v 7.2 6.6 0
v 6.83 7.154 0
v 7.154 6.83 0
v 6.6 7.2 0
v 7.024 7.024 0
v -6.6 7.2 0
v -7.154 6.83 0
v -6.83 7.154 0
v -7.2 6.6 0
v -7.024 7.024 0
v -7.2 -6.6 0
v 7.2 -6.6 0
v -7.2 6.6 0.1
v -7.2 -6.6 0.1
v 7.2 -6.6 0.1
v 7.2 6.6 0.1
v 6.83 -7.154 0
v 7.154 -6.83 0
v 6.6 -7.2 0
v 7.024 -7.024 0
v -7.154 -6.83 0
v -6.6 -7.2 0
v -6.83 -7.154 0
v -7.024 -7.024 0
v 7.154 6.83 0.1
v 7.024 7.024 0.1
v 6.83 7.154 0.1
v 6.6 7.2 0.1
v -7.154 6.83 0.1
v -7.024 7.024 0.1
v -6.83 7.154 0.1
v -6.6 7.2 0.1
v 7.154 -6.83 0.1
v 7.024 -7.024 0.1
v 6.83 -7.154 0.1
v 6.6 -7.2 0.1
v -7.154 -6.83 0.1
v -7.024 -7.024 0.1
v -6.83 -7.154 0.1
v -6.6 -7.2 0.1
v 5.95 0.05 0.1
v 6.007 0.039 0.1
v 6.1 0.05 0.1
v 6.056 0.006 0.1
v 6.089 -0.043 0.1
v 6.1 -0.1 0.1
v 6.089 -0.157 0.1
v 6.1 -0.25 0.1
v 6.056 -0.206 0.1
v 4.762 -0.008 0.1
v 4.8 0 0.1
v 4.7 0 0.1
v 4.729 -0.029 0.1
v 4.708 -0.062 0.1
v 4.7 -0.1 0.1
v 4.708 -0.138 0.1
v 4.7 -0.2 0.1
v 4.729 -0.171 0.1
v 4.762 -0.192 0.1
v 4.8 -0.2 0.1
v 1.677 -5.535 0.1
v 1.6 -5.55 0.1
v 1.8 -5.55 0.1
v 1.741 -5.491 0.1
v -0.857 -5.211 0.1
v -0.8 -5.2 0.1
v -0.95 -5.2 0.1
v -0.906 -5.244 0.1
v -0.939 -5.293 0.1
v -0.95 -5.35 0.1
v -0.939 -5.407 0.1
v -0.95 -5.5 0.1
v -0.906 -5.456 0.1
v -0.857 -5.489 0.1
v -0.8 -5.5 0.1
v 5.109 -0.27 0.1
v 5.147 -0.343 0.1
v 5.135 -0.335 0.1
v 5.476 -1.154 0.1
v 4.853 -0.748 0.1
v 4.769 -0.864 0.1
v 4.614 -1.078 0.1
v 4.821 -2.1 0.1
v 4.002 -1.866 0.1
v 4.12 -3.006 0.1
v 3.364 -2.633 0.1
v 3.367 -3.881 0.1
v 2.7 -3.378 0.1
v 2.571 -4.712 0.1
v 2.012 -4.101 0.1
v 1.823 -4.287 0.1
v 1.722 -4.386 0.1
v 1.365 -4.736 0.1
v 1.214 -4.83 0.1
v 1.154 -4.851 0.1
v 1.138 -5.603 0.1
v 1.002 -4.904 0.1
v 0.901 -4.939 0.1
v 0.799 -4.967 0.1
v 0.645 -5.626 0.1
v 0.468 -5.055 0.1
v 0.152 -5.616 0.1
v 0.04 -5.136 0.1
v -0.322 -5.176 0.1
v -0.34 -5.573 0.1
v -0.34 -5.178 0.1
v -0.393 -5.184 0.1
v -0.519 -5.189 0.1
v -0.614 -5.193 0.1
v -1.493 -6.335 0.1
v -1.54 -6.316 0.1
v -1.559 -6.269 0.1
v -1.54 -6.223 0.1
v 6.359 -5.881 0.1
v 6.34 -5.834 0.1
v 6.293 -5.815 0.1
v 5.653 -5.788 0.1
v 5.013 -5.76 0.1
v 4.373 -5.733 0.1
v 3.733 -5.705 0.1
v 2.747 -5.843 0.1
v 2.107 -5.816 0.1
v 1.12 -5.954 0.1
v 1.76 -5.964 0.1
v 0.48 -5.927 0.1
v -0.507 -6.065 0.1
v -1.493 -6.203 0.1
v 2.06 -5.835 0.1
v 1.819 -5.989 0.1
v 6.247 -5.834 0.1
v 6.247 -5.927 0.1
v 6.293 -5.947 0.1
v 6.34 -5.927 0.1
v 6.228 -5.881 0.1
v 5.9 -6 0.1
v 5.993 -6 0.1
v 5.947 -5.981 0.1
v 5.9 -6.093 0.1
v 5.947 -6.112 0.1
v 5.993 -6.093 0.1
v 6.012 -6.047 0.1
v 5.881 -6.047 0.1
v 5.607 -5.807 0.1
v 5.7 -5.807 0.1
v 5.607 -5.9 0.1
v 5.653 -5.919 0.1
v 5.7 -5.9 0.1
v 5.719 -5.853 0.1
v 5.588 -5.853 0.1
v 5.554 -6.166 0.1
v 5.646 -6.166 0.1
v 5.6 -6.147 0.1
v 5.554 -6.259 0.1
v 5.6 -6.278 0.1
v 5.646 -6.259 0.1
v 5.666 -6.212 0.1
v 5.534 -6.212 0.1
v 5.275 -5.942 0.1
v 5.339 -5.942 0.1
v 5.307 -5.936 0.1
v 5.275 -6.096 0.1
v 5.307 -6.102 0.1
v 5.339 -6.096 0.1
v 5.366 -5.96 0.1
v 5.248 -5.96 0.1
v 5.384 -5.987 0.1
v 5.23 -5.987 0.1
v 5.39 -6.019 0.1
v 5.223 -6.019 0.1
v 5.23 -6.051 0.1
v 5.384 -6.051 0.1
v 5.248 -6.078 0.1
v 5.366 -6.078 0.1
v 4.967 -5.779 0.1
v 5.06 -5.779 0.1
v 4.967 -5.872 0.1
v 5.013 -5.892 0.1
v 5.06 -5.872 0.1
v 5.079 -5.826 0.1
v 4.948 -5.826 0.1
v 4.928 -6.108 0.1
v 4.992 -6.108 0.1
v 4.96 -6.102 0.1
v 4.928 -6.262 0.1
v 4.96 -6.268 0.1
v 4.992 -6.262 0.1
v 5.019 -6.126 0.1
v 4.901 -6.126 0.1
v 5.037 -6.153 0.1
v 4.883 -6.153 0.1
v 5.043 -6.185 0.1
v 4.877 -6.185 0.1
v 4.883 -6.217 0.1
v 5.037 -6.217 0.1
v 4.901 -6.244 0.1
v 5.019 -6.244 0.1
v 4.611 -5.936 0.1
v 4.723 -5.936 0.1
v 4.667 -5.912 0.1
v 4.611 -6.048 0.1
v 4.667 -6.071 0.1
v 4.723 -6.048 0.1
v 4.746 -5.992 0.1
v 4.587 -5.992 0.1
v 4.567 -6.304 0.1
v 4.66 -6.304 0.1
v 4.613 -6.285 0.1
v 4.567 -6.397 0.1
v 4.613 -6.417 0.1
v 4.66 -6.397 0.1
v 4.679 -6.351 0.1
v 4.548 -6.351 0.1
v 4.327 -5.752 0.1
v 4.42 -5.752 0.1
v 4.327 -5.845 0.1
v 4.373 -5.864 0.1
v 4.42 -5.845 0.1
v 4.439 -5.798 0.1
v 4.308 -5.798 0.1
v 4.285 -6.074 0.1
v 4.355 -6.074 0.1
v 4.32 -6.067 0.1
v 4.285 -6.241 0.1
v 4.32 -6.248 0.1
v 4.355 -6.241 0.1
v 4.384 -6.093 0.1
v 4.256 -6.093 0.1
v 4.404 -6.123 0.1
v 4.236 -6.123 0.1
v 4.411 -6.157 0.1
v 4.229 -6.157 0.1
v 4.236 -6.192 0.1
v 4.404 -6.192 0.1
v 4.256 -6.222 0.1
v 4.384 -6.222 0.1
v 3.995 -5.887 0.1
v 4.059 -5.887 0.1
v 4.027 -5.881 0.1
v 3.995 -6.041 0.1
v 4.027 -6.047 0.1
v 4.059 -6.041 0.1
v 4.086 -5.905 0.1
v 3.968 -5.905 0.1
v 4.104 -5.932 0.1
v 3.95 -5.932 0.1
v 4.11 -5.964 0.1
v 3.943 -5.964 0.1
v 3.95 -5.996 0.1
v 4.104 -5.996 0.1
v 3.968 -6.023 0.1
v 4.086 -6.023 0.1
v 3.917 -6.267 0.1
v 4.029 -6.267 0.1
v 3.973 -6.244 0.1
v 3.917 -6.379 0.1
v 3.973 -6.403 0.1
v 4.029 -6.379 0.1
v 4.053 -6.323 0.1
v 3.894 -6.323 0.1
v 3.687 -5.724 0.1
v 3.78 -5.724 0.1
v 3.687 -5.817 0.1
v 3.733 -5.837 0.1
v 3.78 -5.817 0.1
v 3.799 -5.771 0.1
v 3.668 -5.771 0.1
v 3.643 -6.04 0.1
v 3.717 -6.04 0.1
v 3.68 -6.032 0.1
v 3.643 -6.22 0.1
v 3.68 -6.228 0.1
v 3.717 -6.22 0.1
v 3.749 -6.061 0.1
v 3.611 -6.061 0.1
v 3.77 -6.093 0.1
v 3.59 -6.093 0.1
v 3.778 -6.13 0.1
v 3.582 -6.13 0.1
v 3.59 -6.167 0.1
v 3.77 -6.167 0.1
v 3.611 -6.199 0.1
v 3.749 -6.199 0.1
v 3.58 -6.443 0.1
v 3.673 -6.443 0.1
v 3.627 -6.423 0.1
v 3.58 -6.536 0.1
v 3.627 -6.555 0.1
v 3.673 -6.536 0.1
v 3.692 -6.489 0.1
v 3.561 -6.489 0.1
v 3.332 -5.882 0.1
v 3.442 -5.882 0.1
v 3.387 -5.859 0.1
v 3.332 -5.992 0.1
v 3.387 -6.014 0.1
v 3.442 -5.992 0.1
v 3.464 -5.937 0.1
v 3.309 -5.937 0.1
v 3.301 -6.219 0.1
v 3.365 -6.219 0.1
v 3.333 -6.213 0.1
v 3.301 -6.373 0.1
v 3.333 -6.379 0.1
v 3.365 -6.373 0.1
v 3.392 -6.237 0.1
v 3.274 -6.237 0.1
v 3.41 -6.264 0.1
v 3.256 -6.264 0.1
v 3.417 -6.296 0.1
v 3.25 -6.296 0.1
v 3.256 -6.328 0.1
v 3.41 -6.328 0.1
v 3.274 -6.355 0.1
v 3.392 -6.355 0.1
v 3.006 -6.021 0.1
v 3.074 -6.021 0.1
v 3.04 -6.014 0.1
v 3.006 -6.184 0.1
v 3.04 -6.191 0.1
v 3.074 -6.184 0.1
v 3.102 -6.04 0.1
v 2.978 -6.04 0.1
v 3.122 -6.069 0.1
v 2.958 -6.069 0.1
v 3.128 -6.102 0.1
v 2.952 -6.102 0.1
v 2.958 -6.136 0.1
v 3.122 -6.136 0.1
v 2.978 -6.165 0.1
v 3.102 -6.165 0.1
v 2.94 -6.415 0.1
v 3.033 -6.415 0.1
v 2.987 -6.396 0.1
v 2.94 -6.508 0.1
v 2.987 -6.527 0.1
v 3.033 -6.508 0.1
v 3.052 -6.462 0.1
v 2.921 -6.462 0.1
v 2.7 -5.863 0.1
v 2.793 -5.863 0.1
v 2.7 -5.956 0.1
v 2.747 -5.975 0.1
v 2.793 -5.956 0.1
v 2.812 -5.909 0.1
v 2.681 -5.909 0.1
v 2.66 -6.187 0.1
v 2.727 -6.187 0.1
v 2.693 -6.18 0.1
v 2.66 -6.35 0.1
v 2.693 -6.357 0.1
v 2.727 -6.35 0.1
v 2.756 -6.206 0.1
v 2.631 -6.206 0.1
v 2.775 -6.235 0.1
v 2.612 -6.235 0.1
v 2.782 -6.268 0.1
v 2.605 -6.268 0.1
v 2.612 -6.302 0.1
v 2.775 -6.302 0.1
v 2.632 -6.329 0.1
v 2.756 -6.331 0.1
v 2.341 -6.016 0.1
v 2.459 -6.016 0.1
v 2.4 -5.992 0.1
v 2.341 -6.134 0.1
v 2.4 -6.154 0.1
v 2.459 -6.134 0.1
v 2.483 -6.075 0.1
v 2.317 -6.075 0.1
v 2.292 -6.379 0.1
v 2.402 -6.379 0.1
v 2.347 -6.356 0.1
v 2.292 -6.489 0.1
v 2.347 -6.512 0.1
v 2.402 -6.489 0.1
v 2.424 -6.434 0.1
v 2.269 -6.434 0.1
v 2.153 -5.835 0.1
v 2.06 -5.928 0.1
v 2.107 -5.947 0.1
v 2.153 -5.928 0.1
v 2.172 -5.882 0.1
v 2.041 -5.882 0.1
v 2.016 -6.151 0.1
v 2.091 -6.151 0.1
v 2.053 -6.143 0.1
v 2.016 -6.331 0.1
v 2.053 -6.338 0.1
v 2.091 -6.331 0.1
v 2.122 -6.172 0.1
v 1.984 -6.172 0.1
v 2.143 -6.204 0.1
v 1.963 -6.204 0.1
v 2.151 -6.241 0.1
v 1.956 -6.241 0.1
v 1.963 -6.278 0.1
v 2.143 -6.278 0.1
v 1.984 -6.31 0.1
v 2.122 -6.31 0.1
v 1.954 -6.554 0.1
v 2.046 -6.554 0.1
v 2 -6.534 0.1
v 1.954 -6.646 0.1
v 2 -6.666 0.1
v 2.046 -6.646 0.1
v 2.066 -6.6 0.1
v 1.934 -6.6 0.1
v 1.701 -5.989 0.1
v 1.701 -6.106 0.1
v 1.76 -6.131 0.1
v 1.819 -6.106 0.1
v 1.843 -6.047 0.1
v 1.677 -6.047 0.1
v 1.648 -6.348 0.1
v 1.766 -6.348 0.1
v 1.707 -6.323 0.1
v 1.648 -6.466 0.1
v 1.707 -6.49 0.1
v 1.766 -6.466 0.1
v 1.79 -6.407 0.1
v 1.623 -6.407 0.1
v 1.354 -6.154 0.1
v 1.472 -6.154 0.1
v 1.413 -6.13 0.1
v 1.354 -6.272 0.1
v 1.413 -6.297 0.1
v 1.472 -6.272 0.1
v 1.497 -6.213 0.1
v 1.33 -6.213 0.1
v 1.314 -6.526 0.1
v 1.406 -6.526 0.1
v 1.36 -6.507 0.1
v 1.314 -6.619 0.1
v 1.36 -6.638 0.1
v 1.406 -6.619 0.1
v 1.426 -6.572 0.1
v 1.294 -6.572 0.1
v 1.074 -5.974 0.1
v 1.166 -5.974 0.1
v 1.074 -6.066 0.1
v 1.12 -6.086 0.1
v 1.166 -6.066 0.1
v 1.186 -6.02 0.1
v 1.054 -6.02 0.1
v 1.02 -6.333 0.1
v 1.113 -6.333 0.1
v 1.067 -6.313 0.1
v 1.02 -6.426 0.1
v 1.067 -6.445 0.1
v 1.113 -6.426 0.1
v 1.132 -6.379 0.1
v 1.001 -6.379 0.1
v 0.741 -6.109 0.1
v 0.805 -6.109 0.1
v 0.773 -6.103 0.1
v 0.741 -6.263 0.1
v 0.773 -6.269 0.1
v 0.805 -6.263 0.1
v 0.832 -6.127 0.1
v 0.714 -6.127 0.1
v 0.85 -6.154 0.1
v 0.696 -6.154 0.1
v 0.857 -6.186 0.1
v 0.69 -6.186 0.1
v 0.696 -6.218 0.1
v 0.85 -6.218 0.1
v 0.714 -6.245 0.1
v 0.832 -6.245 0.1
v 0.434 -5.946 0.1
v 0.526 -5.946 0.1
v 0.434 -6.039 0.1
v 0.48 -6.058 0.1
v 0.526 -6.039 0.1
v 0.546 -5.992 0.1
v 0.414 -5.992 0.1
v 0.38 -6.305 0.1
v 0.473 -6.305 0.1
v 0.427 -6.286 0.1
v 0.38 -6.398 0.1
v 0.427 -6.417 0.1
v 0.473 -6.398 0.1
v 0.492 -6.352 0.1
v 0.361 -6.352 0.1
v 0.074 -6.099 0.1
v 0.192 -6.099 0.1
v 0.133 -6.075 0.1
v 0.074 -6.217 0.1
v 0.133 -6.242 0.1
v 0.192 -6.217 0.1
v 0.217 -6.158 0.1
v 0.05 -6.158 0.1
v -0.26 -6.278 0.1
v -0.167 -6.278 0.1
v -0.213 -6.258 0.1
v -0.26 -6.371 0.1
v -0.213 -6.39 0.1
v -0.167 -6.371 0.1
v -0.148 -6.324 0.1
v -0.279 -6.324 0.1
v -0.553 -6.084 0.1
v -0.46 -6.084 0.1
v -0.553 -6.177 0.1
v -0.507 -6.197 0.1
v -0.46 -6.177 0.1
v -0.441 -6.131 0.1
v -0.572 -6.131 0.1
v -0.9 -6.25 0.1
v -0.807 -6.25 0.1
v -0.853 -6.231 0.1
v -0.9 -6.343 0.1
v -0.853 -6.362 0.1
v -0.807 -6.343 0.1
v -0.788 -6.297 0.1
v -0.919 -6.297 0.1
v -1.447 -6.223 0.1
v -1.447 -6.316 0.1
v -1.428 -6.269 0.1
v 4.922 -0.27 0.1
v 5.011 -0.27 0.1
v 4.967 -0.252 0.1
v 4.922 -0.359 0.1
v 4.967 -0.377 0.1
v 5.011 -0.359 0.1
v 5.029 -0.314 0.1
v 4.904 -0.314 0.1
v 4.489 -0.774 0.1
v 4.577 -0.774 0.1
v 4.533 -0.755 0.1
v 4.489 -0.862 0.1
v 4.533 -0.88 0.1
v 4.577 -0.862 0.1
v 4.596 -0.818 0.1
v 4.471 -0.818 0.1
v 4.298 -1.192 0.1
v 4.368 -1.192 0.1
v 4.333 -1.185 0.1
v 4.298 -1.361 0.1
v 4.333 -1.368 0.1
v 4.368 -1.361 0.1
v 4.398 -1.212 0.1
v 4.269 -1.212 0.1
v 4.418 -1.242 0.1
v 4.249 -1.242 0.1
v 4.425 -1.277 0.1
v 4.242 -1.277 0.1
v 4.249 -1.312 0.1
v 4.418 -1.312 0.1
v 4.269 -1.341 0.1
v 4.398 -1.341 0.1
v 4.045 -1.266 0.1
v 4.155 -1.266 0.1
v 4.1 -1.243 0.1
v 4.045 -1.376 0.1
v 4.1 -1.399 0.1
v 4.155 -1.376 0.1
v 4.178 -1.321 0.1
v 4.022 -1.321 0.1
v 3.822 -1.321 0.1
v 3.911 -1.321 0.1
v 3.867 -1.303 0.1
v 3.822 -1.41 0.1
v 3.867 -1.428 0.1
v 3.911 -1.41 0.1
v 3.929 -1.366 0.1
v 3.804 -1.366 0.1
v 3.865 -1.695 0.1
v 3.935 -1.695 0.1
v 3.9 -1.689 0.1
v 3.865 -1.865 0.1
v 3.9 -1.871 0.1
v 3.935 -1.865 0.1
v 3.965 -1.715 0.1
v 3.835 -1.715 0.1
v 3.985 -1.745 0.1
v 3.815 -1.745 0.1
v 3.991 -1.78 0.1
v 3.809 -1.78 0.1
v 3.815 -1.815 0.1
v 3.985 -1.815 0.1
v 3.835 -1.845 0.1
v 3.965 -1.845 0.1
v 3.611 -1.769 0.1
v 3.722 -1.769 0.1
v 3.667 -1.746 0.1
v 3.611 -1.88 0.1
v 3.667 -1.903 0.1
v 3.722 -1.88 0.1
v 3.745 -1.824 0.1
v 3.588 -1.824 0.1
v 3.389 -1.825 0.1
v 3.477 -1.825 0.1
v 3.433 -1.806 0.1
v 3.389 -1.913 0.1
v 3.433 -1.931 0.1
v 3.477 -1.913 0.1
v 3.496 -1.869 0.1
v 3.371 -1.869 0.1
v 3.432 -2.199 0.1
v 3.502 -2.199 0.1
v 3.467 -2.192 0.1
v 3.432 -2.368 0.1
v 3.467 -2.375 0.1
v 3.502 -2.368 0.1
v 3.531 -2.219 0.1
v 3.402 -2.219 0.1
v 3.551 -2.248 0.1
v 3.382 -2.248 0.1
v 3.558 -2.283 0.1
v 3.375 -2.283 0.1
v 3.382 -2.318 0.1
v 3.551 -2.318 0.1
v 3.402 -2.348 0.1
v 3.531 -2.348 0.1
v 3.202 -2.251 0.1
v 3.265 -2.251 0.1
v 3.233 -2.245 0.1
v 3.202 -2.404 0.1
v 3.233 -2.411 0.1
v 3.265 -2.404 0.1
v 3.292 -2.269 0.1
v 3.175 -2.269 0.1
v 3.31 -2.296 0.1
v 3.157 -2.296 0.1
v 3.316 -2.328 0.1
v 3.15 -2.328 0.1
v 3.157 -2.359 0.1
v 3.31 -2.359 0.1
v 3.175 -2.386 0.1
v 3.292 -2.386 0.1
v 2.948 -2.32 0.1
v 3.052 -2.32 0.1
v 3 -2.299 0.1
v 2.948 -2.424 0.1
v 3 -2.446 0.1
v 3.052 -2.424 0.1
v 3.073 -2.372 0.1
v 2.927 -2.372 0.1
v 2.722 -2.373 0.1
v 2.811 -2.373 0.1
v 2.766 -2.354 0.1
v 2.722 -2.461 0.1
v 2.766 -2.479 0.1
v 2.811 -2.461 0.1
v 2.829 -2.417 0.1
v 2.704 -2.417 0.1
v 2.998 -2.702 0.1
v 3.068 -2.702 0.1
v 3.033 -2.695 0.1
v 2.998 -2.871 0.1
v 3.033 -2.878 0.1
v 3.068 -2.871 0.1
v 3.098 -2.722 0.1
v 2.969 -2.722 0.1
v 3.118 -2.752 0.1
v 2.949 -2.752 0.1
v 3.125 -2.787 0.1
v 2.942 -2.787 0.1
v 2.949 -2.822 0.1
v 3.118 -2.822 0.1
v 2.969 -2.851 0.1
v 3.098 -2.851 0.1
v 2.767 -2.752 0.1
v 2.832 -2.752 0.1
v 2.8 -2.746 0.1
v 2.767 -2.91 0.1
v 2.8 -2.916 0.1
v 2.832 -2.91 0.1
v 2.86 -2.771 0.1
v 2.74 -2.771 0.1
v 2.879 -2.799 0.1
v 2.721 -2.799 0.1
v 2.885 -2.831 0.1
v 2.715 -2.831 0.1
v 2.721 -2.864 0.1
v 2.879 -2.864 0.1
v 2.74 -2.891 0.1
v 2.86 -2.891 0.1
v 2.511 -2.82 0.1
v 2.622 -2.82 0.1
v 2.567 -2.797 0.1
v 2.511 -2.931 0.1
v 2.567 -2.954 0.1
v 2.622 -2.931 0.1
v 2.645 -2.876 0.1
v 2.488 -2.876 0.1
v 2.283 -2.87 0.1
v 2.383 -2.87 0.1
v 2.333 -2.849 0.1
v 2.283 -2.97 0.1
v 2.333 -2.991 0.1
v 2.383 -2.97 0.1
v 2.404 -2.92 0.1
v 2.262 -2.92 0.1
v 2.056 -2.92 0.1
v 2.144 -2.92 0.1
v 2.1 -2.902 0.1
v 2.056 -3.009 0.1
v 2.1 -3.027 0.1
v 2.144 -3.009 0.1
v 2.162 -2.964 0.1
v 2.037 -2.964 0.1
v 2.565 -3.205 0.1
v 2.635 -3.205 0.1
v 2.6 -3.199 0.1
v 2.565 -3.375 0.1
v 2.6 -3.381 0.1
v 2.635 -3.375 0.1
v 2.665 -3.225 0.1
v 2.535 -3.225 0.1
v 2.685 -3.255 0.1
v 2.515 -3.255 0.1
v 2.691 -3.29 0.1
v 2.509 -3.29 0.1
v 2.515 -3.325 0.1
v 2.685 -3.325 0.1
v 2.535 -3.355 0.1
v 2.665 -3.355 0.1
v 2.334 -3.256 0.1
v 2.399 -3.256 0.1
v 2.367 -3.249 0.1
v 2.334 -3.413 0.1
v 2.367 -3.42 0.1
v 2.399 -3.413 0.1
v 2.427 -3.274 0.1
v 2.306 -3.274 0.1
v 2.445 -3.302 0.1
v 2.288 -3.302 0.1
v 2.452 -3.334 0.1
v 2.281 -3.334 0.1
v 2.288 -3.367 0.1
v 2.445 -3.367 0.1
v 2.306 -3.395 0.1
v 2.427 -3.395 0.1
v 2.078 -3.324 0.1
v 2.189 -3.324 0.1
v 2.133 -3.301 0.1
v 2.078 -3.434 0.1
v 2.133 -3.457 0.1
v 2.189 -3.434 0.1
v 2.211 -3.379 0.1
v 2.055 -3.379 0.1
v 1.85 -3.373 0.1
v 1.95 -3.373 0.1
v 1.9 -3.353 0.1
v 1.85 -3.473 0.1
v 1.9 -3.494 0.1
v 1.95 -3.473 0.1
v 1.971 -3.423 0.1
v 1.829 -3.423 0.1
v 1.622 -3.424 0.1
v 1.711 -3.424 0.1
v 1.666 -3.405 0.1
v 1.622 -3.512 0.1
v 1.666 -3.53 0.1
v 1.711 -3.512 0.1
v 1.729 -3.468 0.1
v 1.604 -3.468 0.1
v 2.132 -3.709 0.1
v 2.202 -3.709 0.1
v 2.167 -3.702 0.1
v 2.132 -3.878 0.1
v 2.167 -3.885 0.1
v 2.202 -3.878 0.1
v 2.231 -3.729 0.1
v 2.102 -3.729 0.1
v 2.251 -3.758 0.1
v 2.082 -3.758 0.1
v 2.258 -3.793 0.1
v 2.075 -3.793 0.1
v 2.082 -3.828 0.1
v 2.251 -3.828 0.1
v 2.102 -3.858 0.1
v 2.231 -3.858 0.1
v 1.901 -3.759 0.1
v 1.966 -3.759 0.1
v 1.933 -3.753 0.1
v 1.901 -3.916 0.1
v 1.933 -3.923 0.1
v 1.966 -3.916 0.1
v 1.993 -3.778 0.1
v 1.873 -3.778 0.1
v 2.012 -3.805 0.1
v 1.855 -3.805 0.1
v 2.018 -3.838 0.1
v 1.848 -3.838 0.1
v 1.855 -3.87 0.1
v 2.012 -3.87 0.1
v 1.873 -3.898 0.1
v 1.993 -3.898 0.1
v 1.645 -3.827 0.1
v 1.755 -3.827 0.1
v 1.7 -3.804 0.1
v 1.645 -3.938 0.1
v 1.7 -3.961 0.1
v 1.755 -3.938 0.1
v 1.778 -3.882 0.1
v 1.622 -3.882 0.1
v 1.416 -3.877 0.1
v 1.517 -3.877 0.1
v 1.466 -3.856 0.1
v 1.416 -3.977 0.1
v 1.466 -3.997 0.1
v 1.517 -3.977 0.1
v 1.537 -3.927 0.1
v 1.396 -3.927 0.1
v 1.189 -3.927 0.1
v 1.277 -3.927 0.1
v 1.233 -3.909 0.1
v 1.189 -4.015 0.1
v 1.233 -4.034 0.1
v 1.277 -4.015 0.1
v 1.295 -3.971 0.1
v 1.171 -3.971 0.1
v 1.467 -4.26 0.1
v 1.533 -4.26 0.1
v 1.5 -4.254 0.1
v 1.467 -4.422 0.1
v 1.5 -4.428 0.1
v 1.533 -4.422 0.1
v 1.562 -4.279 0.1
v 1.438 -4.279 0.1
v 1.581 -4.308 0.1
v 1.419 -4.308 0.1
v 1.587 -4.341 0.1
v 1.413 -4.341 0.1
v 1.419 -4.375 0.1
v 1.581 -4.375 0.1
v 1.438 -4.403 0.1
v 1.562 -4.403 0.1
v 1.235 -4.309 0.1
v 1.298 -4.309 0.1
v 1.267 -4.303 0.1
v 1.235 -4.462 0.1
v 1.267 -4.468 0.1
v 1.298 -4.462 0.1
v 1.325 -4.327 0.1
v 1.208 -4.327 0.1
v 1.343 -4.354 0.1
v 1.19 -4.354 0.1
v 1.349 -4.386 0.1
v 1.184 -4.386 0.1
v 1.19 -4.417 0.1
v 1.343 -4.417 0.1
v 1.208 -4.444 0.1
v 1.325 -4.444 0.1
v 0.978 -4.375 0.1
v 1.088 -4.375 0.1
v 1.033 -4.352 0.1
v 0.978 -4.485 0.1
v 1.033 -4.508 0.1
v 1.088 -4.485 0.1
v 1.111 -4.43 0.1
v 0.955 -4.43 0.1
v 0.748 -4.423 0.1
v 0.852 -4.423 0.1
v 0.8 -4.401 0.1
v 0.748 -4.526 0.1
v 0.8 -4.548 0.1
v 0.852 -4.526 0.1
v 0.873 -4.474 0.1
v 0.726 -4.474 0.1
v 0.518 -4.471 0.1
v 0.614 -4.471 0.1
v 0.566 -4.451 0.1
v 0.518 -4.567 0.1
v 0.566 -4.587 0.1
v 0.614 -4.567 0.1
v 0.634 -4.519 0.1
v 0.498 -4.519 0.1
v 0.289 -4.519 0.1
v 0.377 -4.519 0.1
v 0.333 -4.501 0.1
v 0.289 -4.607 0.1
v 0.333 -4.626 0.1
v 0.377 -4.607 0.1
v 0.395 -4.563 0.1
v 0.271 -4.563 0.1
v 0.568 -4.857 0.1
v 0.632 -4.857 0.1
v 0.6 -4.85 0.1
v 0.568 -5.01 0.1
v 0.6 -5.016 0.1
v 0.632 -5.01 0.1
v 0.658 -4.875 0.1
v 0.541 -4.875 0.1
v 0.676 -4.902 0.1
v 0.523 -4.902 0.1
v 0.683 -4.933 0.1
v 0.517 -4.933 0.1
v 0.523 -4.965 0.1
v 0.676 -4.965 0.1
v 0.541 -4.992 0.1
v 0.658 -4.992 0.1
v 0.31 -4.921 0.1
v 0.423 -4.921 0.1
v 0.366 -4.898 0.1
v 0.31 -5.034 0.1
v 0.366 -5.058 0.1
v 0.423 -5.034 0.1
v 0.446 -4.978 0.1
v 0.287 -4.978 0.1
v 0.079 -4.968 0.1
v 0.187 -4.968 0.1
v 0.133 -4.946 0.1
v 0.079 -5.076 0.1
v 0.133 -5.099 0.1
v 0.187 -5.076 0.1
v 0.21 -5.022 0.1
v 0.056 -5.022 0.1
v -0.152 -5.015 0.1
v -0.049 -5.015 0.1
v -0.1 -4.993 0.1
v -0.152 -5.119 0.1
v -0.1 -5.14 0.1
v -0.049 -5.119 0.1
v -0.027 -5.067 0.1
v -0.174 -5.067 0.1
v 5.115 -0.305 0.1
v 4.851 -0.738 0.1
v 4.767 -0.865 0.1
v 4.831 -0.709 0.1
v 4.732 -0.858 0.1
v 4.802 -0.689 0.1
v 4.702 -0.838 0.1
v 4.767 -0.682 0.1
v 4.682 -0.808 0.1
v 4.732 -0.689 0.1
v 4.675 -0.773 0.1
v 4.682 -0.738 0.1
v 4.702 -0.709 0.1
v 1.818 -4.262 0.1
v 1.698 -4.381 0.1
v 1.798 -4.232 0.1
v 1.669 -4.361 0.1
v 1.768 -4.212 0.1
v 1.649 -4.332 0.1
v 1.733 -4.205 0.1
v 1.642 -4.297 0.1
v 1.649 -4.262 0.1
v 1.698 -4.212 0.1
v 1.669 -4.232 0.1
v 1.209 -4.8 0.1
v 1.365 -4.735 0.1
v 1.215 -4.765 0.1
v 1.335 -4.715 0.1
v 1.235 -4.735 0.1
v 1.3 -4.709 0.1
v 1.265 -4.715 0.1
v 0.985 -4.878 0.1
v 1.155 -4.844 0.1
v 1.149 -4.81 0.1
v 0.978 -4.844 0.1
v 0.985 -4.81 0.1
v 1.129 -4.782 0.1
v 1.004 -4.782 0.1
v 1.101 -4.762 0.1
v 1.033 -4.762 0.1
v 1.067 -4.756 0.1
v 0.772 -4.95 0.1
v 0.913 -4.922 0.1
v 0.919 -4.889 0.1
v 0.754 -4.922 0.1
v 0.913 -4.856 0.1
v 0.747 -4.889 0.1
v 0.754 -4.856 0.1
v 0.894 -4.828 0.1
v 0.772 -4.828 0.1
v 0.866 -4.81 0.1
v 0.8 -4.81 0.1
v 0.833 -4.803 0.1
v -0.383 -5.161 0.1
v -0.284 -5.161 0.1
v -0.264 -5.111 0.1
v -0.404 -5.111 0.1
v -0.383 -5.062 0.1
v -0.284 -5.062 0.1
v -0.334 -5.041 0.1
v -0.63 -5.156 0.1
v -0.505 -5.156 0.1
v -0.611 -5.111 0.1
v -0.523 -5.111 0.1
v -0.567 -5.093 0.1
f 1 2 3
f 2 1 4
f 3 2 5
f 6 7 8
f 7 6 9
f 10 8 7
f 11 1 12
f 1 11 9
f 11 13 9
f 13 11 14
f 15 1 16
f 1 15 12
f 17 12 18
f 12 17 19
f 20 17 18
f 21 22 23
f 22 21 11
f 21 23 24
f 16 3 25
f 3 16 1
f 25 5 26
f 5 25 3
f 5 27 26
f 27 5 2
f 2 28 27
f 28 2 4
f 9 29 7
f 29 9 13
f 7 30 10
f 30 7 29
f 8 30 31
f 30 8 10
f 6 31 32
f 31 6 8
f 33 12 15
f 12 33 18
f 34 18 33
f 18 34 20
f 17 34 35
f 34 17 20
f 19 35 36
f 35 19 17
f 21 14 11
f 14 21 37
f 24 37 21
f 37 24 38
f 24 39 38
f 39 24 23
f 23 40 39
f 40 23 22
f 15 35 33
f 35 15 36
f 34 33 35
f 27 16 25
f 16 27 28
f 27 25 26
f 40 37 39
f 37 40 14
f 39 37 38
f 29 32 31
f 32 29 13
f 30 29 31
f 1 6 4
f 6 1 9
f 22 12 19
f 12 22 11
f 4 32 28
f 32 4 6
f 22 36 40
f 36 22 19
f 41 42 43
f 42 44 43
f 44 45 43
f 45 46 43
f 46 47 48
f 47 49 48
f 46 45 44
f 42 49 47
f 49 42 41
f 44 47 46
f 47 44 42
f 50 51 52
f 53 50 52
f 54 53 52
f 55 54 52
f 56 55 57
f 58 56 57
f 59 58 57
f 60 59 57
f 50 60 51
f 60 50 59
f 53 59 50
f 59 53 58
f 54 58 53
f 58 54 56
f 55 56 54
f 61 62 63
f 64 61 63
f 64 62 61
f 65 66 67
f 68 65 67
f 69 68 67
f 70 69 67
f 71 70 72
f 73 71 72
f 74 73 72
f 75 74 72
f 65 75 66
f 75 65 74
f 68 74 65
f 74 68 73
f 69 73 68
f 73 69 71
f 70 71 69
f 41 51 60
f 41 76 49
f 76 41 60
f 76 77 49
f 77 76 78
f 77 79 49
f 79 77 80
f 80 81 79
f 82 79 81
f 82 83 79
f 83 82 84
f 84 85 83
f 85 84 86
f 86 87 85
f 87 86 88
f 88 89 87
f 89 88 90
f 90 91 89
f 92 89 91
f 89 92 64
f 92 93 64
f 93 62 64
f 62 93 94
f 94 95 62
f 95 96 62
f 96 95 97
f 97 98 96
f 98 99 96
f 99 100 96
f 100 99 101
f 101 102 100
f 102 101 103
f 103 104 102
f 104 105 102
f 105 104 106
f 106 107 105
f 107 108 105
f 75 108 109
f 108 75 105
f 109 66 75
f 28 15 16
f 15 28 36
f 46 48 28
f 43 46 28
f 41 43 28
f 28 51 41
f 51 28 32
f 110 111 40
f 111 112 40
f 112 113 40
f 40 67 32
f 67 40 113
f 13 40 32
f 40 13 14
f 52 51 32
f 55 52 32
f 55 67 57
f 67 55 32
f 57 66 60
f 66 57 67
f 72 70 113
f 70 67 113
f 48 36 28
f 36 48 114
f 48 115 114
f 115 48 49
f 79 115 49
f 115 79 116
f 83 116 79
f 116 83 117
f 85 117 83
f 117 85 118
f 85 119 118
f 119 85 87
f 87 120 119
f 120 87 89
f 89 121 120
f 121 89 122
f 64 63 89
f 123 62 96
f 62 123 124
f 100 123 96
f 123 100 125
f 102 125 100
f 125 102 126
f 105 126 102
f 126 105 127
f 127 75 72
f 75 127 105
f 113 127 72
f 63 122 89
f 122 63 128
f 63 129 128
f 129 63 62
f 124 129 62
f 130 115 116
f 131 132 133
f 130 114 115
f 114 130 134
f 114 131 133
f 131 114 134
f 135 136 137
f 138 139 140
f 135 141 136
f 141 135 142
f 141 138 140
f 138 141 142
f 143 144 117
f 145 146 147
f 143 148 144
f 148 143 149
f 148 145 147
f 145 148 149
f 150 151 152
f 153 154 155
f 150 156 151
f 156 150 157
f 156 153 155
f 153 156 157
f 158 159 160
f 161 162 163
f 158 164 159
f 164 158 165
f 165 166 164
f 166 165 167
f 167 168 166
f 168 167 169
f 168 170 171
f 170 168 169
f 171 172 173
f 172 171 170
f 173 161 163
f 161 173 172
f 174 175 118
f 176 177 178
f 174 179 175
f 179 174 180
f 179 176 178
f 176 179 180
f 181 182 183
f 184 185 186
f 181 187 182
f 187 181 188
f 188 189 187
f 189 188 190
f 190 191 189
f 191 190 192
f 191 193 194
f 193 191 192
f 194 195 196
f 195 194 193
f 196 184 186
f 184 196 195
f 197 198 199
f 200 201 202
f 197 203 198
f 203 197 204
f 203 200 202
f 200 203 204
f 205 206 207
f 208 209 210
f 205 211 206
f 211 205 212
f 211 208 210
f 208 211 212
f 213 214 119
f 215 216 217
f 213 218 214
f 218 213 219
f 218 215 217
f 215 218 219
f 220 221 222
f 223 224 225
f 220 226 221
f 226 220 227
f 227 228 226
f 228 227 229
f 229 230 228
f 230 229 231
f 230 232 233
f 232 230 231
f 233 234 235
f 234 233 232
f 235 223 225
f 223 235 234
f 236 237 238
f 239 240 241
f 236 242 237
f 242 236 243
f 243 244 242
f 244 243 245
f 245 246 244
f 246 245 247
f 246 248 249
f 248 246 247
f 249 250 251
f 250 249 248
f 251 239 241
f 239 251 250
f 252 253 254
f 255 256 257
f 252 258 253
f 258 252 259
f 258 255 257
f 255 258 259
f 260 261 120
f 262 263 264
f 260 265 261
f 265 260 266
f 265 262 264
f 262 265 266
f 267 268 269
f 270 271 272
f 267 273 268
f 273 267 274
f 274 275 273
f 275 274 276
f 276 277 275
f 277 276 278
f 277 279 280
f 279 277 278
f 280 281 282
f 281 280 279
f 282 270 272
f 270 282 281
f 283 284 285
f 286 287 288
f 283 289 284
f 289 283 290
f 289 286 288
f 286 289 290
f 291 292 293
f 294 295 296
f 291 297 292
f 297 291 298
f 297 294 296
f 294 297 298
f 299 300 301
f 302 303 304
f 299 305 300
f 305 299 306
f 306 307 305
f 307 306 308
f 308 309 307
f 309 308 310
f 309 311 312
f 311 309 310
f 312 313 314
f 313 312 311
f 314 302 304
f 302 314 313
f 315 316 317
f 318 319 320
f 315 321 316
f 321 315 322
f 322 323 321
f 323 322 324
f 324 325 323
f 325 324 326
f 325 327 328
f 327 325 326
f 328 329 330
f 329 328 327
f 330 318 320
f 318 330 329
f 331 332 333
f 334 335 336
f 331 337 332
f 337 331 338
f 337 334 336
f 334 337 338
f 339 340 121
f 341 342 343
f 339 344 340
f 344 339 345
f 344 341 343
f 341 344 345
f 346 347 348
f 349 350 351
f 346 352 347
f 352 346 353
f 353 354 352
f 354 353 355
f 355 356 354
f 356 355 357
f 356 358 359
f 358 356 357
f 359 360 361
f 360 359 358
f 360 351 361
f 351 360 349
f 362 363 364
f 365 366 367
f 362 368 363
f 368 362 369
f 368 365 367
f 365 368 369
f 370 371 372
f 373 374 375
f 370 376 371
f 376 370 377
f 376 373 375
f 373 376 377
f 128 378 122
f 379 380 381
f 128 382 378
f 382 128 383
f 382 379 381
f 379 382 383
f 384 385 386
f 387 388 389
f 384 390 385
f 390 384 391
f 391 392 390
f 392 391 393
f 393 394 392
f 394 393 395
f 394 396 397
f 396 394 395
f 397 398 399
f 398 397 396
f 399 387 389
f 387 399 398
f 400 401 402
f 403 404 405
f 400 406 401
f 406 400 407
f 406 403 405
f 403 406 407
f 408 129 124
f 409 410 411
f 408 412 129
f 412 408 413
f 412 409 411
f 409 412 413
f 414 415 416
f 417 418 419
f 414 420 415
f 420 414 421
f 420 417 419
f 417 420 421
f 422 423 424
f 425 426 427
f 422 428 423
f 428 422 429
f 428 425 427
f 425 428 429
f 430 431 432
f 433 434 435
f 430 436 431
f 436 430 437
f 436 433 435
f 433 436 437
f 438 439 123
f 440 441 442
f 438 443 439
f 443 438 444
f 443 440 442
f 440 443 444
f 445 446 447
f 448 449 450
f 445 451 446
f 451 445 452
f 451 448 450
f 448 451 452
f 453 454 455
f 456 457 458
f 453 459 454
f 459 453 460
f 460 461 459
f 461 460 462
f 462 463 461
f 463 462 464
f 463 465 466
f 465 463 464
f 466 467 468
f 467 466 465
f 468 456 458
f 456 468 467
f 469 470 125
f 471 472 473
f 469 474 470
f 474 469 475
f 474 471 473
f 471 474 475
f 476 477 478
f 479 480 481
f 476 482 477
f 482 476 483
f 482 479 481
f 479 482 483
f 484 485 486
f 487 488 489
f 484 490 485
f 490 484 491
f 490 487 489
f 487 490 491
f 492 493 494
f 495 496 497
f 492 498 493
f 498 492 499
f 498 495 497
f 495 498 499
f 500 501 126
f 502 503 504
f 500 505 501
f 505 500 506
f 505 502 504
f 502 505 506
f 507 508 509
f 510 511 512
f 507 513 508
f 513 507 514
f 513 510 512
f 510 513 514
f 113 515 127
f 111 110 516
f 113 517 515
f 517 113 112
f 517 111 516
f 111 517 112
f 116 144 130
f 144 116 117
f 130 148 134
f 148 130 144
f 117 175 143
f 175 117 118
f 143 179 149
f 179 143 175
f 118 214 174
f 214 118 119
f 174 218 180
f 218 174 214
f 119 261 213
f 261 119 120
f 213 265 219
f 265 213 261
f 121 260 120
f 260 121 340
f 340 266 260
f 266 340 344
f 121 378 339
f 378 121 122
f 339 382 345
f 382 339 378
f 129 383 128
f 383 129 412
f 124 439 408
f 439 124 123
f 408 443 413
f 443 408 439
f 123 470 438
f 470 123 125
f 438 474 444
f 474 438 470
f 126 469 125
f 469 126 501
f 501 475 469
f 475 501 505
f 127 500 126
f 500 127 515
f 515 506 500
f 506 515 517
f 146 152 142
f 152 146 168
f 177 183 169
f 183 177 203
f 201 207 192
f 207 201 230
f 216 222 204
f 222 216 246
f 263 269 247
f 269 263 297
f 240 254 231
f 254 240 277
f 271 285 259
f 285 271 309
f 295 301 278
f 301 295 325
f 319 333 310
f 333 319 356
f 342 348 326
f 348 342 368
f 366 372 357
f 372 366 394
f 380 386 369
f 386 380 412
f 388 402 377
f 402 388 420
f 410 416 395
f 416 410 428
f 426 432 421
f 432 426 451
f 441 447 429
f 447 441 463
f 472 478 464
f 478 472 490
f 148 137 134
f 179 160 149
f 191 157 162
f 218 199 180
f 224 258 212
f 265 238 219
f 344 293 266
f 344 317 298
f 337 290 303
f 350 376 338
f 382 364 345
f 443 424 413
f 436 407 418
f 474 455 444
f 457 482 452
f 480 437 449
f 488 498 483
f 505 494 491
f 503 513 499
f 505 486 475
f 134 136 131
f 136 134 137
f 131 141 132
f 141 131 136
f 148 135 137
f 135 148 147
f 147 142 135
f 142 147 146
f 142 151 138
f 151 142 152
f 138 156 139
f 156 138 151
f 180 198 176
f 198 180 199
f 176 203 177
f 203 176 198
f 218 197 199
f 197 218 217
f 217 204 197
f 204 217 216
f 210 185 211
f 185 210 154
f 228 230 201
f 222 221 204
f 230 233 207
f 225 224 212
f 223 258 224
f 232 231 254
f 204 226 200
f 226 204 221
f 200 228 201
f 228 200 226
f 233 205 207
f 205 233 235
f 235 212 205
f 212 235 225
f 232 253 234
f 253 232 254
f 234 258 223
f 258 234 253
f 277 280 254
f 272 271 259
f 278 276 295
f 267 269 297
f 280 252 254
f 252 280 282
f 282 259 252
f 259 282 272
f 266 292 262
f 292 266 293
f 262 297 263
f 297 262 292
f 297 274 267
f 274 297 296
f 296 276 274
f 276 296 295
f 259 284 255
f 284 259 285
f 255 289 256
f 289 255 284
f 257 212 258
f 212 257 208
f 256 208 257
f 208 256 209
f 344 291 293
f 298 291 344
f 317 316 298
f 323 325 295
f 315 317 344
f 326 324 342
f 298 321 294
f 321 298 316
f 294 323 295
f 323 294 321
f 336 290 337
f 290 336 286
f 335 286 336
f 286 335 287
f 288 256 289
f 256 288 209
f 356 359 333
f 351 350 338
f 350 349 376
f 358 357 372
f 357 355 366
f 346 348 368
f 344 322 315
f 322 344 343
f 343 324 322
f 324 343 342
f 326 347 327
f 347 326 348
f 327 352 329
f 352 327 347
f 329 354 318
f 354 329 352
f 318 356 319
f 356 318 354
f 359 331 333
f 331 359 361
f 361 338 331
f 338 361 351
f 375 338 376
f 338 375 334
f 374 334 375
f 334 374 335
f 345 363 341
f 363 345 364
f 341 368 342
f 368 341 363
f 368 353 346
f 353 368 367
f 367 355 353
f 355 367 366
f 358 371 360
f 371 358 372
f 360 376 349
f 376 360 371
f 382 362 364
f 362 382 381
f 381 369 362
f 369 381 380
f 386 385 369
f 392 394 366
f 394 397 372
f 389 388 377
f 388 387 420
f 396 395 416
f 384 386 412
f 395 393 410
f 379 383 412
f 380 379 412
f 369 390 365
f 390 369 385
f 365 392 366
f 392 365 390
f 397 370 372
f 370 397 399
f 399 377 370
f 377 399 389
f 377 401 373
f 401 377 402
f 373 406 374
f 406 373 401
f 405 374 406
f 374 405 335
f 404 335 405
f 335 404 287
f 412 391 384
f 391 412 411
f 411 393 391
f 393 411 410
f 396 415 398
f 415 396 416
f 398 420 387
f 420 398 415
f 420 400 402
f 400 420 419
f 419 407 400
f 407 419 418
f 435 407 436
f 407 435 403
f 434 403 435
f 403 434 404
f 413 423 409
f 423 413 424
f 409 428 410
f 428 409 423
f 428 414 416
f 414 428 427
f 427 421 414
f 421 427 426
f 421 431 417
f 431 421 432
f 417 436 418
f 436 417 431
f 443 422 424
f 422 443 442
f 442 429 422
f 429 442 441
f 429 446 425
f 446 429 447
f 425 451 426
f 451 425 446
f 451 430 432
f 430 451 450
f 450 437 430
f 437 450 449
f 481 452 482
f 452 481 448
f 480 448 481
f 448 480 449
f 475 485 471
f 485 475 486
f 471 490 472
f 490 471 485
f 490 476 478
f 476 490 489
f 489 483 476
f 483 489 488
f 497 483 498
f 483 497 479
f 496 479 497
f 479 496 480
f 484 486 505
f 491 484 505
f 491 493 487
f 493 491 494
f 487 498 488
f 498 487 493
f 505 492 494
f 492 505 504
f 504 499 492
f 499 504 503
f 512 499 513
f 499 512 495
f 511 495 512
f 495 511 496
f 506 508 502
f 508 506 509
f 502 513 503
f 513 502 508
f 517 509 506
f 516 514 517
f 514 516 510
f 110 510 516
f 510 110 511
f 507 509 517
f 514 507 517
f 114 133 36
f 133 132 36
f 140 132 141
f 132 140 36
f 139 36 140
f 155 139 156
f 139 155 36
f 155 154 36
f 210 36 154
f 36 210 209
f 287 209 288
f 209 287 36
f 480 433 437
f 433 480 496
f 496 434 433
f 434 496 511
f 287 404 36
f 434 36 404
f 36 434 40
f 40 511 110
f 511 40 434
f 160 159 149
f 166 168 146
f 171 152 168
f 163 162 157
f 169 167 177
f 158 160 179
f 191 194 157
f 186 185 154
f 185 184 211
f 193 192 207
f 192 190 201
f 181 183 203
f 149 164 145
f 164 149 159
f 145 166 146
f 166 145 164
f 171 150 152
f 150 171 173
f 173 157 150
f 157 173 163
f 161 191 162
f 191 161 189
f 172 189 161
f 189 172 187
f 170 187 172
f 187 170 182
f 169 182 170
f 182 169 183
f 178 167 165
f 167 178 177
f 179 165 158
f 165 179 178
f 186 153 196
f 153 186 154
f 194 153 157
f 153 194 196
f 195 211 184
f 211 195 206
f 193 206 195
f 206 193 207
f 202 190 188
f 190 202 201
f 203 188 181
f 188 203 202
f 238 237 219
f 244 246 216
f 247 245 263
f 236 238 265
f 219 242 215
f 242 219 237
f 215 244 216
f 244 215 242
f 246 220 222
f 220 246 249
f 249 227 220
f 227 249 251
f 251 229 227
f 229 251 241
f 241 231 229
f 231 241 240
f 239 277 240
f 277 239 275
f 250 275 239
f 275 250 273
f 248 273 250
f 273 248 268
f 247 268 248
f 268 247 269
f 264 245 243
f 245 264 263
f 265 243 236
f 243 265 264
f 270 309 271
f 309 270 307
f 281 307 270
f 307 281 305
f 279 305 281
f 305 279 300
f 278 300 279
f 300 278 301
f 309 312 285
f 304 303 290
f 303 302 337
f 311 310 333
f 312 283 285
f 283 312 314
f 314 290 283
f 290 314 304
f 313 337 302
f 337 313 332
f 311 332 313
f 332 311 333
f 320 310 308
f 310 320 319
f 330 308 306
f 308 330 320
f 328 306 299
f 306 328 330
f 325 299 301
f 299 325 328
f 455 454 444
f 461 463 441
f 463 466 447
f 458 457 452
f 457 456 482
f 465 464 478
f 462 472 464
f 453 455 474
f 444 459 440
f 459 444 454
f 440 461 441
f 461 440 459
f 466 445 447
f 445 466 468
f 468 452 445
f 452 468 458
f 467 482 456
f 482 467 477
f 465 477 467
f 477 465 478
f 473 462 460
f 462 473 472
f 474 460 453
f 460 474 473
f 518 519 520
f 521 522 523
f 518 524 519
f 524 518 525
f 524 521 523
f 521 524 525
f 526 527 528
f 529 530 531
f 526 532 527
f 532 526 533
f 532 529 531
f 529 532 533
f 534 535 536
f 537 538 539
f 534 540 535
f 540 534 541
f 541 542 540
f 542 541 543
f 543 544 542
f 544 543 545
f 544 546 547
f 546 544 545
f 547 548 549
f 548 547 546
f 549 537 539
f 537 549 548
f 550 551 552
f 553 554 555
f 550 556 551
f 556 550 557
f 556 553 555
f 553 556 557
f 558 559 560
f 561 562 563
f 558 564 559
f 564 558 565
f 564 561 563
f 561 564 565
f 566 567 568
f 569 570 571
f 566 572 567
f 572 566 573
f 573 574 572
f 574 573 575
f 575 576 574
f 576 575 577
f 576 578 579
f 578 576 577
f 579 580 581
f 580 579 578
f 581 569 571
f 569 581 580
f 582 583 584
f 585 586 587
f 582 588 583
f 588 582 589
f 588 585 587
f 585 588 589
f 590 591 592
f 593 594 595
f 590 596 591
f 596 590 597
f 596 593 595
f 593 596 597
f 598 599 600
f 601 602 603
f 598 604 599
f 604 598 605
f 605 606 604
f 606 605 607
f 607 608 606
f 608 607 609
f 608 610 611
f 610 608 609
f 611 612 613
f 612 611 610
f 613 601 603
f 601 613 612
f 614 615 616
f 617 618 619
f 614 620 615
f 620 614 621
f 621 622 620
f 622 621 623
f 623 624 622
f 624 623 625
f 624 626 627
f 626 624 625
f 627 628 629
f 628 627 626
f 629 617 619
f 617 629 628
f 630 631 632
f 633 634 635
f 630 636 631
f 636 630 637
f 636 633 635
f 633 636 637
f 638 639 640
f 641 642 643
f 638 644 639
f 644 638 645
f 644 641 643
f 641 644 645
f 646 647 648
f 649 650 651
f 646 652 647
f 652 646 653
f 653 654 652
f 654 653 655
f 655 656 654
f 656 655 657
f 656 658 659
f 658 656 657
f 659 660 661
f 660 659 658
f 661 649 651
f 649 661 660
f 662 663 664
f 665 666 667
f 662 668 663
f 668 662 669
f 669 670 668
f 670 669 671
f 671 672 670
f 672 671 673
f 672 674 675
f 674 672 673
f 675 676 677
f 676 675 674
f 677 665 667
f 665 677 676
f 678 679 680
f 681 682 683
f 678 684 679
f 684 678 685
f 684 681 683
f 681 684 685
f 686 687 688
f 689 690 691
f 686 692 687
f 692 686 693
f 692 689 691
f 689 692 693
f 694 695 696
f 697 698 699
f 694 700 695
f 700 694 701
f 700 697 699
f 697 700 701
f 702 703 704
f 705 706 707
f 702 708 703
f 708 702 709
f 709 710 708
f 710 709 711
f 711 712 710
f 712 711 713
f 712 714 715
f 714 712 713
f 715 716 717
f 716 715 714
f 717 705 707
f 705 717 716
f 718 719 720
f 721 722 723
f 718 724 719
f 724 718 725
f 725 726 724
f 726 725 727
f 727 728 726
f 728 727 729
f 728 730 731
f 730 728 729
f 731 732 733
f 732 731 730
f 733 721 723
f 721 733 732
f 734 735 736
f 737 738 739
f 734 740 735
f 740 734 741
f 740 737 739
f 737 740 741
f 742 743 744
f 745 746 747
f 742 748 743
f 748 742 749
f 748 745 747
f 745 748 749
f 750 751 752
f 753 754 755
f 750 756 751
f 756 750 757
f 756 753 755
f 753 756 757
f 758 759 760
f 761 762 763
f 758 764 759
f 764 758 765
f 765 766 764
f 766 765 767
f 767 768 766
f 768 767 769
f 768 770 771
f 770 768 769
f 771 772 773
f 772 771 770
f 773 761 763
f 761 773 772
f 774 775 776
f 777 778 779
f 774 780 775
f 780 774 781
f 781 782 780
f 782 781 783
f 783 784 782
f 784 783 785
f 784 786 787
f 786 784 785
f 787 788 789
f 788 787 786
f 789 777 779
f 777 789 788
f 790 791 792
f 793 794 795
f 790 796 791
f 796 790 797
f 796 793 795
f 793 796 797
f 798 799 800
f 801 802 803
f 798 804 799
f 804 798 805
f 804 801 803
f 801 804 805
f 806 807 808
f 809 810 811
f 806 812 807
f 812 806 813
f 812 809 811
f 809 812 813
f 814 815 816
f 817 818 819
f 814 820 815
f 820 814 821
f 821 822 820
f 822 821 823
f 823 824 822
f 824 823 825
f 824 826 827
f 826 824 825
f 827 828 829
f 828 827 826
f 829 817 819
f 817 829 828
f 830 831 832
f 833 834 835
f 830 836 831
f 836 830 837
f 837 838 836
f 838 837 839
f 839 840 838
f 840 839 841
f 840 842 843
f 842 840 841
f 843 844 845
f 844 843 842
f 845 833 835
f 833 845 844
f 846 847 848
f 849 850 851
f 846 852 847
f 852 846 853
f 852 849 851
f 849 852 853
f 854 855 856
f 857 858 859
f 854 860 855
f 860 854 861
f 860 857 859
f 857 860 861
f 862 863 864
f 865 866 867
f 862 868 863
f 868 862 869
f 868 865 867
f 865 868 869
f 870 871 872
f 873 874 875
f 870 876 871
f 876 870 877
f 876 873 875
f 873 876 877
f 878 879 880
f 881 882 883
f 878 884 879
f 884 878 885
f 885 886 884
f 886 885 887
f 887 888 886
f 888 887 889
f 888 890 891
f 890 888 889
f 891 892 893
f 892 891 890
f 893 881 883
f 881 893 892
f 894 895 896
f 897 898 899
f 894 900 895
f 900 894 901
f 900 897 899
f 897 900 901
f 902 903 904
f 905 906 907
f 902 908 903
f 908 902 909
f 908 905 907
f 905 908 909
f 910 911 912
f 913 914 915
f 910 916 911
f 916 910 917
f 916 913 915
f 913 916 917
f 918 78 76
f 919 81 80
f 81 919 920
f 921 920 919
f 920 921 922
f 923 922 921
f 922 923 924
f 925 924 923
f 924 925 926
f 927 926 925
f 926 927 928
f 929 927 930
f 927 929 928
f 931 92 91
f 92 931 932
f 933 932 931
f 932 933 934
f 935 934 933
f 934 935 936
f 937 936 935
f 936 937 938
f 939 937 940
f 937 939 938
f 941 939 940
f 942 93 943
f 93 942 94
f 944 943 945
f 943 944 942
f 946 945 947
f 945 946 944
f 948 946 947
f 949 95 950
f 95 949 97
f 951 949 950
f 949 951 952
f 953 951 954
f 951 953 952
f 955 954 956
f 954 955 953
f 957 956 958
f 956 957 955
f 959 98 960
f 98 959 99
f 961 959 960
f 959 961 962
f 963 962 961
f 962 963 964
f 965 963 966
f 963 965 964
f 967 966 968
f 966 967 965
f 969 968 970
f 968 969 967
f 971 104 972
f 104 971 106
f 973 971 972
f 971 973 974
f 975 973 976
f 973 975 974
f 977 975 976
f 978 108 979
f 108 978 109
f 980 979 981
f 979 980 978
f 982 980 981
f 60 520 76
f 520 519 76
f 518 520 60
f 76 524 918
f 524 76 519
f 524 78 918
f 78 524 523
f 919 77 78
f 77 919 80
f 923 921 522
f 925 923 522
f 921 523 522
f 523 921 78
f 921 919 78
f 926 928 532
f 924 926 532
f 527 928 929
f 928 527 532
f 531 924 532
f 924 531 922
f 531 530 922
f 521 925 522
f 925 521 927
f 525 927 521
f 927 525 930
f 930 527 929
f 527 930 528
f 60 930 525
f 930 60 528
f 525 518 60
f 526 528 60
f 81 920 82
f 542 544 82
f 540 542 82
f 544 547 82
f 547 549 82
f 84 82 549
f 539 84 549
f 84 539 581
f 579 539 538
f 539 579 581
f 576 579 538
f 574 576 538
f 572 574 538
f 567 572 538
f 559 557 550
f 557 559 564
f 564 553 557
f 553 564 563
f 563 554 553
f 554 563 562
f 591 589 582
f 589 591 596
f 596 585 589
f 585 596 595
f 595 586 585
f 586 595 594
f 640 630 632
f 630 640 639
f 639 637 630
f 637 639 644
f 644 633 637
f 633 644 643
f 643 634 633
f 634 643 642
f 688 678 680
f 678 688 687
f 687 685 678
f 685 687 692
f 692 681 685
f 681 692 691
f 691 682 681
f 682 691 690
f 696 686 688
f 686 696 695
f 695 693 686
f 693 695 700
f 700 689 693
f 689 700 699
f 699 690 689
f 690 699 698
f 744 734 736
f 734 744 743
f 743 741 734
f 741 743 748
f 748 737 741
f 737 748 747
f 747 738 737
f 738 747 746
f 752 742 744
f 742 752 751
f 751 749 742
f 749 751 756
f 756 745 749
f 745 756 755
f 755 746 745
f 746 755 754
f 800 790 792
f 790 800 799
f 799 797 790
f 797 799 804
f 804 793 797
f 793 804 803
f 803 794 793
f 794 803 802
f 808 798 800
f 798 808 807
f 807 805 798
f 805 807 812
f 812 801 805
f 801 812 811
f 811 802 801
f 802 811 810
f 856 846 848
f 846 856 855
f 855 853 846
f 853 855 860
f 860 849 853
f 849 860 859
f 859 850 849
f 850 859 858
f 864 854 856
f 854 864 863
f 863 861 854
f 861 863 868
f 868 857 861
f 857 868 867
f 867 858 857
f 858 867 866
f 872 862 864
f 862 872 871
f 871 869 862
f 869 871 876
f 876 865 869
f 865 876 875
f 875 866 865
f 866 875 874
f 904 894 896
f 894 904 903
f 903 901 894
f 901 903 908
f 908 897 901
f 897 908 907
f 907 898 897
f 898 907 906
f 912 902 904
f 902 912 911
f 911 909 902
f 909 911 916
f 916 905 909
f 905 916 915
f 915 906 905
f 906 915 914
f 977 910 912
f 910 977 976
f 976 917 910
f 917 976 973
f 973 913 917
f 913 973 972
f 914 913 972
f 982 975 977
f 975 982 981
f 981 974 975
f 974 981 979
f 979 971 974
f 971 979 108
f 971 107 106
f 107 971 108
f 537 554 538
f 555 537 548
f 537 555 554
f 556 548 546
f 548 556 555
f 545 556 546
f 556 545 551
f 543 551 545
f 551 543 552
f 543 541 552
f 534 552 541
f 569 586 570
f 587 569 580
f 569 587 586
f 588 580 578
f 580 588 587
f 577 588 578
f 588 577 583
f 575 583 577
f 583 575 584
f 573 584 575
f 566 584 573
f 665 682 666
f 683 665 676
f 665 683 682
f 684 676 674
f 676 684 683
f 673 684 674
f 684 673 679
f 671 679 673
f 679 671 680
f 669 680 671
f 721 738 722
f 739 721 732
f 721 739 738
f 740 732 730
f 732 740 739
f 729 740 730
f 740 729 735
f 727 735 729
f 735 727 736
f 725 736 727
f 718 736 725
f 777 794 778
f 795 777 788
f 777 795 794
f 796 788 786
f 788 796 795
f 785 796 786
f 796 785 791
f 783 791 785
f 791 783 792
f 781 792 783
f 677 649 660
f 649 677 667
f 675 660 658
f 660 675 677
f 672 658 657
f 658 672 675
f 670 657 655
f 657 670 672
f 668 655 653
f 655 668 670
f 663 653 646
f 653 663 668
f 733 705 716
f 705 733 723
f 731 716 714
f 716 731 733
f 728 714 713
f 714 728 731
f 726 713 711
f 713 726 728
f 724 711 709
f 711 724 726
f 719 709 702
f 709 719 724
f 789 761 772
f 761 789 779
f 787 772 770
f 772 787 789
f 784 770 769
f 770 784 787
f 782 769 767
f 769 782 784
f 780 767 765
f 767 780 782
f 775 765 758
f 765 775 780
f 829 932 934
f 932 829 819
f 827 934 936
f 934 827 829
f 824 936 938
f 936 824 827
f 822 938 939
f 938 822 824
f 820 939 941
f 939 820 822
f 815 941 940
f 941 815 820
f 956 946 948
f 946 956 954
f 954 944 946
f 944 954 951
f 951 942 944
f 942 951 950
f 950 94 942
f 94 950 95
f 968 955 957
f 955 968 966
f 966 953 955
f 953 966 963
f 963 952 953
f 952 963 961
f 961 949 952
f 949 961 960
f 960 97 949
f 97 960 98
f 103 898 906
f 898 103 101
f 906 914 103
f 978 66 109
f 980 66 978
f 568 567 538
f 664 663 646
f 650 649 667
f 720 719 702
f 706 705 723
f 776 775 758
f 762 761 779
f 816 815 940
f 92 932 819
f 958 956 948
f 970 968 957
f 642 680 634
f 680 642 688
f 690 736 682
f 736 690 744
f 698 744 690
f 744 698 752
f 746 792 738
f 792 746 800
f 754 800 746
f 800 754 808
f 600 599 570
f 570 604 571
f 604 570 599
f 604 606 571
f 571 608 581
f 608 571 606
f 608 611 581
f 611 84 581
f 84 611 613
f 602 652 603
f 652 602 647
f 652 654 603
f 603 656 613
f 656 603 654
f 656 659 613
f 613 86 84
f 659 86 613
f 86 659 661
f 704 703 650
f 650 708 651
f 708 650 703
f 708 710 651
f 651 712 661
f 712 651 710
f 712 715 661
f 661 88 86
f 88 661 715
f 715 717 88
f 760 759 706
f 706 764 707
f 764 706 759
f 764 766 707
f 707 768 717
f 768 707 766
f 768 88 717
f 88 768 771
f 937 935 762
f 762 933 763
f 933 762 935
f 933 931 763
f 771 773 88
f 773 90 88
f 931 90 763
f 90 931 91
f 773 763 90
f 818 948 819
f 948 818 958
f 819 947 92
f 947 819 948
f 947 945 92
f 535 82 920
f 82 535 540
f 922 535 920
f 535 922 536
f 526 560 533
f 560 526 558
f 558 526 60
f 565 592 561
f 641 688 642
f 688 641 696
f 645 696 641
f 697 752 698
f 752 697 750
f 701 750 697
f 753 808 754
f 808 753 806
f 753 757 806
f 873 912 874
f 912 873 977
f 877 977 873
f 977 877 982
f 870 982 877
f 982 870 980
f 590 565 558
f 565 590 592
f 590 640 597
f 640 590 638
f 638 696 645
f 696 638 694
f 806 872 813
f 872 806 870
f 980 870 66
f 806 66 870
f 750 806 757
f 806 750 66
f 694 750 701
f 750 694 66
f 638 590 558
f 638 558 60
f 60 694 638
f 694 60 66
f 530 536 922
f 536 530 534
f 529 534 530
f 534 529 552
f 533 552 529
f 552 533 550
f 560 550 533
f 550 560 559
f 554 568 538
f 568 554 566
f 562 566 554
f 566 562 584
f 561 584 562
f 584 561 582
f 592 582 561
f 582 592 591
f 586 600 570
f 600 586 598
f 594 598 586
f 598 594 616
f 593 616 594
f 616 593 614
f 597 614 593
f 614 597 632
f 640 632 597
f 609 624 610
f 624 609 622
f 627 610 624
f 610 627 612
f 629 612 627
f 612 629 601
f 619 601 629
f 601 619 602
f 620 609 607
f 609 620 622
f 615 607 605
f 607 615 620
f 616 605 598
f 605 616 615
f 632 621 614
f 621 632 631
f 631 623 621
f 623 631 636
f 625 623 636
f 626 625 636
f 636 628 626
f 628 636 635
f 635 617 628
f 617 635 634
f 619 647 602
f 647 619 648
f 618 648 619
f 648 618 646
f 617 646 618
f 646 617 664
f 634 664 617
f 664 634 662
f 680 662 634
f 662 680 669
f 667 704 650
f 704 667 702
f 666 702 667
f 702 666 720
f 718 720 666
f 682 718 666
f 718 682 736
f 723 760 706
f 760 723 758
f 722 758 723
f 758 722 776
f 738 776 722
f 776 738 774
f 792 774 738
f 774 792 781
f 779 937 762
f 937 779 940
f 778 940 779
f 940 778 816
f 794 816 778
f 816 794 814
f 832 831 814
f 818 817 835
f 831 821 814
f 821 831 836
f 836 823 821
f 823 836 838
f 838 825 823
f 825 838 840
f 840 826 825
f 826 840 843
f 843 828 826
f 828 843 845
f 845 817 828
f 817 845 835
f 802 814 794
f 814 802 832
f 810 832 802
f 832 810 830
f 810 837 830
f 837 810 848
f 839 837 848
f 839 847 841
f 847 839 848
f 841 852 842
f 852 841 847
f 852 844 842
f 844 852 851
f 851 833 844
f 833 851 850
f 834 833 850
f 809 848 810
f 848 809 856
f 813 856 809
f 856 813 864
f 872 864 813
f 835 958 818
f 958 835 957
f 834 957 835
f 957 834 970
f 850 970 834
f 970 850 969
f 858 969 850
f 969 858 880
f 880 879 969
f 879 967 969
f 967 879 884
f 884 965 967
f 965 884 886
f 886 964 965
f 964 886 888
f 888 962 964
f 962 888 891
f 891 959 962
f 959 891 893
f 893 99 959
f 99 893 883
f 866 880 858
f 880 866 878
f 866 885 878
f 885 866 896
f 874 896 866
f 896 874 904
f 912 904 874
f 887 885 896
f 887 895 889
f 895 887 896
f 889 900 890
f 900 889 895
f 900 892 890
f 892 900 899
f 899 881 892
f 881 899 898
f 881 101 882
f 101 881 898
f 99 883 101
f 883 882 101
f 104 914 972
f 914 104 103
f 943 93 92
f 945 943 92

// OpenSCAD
use <../lib.scad>
use <6142622b.scad>
function ldraw_lib__6142622c() = [
// 0 Sticker  1.8 x  1.8 with Black Air Vents on Yellow Background Left
// 0 Name: 6142622c.dat
// 0 Author: Massimo Maso [Sirio]
// 0 !LDRAW_ORG Part UPDATE 2022-03
// 0 !LICENSE Licensed under CC BY 2.0 and CC BY 4.0 : see CAreadme.txt
// 
// 0 BFC CERTIFY CCW
  [0,"BFC","CERTIFY"],
  [0,"BFC","CCW"],
// 
// 0 !KEYWORDS Chevrolet, Corvette, Set 75870, Speed Champions
// 
// 0 !HISTORY 2022-05-07 [PTadmin] Official Update 2022-03
// 
// 
// 1 16 0 0 0 -1 0 0 0 1 0 0 0 1 6142622b.dat
  [1,16,0,0,0,-1,0,0,0,1,0,0,0,1, ldraw_lib__6142622b()],
];
makepoly(ldraw_lib__6142622c(), line=0.2);
